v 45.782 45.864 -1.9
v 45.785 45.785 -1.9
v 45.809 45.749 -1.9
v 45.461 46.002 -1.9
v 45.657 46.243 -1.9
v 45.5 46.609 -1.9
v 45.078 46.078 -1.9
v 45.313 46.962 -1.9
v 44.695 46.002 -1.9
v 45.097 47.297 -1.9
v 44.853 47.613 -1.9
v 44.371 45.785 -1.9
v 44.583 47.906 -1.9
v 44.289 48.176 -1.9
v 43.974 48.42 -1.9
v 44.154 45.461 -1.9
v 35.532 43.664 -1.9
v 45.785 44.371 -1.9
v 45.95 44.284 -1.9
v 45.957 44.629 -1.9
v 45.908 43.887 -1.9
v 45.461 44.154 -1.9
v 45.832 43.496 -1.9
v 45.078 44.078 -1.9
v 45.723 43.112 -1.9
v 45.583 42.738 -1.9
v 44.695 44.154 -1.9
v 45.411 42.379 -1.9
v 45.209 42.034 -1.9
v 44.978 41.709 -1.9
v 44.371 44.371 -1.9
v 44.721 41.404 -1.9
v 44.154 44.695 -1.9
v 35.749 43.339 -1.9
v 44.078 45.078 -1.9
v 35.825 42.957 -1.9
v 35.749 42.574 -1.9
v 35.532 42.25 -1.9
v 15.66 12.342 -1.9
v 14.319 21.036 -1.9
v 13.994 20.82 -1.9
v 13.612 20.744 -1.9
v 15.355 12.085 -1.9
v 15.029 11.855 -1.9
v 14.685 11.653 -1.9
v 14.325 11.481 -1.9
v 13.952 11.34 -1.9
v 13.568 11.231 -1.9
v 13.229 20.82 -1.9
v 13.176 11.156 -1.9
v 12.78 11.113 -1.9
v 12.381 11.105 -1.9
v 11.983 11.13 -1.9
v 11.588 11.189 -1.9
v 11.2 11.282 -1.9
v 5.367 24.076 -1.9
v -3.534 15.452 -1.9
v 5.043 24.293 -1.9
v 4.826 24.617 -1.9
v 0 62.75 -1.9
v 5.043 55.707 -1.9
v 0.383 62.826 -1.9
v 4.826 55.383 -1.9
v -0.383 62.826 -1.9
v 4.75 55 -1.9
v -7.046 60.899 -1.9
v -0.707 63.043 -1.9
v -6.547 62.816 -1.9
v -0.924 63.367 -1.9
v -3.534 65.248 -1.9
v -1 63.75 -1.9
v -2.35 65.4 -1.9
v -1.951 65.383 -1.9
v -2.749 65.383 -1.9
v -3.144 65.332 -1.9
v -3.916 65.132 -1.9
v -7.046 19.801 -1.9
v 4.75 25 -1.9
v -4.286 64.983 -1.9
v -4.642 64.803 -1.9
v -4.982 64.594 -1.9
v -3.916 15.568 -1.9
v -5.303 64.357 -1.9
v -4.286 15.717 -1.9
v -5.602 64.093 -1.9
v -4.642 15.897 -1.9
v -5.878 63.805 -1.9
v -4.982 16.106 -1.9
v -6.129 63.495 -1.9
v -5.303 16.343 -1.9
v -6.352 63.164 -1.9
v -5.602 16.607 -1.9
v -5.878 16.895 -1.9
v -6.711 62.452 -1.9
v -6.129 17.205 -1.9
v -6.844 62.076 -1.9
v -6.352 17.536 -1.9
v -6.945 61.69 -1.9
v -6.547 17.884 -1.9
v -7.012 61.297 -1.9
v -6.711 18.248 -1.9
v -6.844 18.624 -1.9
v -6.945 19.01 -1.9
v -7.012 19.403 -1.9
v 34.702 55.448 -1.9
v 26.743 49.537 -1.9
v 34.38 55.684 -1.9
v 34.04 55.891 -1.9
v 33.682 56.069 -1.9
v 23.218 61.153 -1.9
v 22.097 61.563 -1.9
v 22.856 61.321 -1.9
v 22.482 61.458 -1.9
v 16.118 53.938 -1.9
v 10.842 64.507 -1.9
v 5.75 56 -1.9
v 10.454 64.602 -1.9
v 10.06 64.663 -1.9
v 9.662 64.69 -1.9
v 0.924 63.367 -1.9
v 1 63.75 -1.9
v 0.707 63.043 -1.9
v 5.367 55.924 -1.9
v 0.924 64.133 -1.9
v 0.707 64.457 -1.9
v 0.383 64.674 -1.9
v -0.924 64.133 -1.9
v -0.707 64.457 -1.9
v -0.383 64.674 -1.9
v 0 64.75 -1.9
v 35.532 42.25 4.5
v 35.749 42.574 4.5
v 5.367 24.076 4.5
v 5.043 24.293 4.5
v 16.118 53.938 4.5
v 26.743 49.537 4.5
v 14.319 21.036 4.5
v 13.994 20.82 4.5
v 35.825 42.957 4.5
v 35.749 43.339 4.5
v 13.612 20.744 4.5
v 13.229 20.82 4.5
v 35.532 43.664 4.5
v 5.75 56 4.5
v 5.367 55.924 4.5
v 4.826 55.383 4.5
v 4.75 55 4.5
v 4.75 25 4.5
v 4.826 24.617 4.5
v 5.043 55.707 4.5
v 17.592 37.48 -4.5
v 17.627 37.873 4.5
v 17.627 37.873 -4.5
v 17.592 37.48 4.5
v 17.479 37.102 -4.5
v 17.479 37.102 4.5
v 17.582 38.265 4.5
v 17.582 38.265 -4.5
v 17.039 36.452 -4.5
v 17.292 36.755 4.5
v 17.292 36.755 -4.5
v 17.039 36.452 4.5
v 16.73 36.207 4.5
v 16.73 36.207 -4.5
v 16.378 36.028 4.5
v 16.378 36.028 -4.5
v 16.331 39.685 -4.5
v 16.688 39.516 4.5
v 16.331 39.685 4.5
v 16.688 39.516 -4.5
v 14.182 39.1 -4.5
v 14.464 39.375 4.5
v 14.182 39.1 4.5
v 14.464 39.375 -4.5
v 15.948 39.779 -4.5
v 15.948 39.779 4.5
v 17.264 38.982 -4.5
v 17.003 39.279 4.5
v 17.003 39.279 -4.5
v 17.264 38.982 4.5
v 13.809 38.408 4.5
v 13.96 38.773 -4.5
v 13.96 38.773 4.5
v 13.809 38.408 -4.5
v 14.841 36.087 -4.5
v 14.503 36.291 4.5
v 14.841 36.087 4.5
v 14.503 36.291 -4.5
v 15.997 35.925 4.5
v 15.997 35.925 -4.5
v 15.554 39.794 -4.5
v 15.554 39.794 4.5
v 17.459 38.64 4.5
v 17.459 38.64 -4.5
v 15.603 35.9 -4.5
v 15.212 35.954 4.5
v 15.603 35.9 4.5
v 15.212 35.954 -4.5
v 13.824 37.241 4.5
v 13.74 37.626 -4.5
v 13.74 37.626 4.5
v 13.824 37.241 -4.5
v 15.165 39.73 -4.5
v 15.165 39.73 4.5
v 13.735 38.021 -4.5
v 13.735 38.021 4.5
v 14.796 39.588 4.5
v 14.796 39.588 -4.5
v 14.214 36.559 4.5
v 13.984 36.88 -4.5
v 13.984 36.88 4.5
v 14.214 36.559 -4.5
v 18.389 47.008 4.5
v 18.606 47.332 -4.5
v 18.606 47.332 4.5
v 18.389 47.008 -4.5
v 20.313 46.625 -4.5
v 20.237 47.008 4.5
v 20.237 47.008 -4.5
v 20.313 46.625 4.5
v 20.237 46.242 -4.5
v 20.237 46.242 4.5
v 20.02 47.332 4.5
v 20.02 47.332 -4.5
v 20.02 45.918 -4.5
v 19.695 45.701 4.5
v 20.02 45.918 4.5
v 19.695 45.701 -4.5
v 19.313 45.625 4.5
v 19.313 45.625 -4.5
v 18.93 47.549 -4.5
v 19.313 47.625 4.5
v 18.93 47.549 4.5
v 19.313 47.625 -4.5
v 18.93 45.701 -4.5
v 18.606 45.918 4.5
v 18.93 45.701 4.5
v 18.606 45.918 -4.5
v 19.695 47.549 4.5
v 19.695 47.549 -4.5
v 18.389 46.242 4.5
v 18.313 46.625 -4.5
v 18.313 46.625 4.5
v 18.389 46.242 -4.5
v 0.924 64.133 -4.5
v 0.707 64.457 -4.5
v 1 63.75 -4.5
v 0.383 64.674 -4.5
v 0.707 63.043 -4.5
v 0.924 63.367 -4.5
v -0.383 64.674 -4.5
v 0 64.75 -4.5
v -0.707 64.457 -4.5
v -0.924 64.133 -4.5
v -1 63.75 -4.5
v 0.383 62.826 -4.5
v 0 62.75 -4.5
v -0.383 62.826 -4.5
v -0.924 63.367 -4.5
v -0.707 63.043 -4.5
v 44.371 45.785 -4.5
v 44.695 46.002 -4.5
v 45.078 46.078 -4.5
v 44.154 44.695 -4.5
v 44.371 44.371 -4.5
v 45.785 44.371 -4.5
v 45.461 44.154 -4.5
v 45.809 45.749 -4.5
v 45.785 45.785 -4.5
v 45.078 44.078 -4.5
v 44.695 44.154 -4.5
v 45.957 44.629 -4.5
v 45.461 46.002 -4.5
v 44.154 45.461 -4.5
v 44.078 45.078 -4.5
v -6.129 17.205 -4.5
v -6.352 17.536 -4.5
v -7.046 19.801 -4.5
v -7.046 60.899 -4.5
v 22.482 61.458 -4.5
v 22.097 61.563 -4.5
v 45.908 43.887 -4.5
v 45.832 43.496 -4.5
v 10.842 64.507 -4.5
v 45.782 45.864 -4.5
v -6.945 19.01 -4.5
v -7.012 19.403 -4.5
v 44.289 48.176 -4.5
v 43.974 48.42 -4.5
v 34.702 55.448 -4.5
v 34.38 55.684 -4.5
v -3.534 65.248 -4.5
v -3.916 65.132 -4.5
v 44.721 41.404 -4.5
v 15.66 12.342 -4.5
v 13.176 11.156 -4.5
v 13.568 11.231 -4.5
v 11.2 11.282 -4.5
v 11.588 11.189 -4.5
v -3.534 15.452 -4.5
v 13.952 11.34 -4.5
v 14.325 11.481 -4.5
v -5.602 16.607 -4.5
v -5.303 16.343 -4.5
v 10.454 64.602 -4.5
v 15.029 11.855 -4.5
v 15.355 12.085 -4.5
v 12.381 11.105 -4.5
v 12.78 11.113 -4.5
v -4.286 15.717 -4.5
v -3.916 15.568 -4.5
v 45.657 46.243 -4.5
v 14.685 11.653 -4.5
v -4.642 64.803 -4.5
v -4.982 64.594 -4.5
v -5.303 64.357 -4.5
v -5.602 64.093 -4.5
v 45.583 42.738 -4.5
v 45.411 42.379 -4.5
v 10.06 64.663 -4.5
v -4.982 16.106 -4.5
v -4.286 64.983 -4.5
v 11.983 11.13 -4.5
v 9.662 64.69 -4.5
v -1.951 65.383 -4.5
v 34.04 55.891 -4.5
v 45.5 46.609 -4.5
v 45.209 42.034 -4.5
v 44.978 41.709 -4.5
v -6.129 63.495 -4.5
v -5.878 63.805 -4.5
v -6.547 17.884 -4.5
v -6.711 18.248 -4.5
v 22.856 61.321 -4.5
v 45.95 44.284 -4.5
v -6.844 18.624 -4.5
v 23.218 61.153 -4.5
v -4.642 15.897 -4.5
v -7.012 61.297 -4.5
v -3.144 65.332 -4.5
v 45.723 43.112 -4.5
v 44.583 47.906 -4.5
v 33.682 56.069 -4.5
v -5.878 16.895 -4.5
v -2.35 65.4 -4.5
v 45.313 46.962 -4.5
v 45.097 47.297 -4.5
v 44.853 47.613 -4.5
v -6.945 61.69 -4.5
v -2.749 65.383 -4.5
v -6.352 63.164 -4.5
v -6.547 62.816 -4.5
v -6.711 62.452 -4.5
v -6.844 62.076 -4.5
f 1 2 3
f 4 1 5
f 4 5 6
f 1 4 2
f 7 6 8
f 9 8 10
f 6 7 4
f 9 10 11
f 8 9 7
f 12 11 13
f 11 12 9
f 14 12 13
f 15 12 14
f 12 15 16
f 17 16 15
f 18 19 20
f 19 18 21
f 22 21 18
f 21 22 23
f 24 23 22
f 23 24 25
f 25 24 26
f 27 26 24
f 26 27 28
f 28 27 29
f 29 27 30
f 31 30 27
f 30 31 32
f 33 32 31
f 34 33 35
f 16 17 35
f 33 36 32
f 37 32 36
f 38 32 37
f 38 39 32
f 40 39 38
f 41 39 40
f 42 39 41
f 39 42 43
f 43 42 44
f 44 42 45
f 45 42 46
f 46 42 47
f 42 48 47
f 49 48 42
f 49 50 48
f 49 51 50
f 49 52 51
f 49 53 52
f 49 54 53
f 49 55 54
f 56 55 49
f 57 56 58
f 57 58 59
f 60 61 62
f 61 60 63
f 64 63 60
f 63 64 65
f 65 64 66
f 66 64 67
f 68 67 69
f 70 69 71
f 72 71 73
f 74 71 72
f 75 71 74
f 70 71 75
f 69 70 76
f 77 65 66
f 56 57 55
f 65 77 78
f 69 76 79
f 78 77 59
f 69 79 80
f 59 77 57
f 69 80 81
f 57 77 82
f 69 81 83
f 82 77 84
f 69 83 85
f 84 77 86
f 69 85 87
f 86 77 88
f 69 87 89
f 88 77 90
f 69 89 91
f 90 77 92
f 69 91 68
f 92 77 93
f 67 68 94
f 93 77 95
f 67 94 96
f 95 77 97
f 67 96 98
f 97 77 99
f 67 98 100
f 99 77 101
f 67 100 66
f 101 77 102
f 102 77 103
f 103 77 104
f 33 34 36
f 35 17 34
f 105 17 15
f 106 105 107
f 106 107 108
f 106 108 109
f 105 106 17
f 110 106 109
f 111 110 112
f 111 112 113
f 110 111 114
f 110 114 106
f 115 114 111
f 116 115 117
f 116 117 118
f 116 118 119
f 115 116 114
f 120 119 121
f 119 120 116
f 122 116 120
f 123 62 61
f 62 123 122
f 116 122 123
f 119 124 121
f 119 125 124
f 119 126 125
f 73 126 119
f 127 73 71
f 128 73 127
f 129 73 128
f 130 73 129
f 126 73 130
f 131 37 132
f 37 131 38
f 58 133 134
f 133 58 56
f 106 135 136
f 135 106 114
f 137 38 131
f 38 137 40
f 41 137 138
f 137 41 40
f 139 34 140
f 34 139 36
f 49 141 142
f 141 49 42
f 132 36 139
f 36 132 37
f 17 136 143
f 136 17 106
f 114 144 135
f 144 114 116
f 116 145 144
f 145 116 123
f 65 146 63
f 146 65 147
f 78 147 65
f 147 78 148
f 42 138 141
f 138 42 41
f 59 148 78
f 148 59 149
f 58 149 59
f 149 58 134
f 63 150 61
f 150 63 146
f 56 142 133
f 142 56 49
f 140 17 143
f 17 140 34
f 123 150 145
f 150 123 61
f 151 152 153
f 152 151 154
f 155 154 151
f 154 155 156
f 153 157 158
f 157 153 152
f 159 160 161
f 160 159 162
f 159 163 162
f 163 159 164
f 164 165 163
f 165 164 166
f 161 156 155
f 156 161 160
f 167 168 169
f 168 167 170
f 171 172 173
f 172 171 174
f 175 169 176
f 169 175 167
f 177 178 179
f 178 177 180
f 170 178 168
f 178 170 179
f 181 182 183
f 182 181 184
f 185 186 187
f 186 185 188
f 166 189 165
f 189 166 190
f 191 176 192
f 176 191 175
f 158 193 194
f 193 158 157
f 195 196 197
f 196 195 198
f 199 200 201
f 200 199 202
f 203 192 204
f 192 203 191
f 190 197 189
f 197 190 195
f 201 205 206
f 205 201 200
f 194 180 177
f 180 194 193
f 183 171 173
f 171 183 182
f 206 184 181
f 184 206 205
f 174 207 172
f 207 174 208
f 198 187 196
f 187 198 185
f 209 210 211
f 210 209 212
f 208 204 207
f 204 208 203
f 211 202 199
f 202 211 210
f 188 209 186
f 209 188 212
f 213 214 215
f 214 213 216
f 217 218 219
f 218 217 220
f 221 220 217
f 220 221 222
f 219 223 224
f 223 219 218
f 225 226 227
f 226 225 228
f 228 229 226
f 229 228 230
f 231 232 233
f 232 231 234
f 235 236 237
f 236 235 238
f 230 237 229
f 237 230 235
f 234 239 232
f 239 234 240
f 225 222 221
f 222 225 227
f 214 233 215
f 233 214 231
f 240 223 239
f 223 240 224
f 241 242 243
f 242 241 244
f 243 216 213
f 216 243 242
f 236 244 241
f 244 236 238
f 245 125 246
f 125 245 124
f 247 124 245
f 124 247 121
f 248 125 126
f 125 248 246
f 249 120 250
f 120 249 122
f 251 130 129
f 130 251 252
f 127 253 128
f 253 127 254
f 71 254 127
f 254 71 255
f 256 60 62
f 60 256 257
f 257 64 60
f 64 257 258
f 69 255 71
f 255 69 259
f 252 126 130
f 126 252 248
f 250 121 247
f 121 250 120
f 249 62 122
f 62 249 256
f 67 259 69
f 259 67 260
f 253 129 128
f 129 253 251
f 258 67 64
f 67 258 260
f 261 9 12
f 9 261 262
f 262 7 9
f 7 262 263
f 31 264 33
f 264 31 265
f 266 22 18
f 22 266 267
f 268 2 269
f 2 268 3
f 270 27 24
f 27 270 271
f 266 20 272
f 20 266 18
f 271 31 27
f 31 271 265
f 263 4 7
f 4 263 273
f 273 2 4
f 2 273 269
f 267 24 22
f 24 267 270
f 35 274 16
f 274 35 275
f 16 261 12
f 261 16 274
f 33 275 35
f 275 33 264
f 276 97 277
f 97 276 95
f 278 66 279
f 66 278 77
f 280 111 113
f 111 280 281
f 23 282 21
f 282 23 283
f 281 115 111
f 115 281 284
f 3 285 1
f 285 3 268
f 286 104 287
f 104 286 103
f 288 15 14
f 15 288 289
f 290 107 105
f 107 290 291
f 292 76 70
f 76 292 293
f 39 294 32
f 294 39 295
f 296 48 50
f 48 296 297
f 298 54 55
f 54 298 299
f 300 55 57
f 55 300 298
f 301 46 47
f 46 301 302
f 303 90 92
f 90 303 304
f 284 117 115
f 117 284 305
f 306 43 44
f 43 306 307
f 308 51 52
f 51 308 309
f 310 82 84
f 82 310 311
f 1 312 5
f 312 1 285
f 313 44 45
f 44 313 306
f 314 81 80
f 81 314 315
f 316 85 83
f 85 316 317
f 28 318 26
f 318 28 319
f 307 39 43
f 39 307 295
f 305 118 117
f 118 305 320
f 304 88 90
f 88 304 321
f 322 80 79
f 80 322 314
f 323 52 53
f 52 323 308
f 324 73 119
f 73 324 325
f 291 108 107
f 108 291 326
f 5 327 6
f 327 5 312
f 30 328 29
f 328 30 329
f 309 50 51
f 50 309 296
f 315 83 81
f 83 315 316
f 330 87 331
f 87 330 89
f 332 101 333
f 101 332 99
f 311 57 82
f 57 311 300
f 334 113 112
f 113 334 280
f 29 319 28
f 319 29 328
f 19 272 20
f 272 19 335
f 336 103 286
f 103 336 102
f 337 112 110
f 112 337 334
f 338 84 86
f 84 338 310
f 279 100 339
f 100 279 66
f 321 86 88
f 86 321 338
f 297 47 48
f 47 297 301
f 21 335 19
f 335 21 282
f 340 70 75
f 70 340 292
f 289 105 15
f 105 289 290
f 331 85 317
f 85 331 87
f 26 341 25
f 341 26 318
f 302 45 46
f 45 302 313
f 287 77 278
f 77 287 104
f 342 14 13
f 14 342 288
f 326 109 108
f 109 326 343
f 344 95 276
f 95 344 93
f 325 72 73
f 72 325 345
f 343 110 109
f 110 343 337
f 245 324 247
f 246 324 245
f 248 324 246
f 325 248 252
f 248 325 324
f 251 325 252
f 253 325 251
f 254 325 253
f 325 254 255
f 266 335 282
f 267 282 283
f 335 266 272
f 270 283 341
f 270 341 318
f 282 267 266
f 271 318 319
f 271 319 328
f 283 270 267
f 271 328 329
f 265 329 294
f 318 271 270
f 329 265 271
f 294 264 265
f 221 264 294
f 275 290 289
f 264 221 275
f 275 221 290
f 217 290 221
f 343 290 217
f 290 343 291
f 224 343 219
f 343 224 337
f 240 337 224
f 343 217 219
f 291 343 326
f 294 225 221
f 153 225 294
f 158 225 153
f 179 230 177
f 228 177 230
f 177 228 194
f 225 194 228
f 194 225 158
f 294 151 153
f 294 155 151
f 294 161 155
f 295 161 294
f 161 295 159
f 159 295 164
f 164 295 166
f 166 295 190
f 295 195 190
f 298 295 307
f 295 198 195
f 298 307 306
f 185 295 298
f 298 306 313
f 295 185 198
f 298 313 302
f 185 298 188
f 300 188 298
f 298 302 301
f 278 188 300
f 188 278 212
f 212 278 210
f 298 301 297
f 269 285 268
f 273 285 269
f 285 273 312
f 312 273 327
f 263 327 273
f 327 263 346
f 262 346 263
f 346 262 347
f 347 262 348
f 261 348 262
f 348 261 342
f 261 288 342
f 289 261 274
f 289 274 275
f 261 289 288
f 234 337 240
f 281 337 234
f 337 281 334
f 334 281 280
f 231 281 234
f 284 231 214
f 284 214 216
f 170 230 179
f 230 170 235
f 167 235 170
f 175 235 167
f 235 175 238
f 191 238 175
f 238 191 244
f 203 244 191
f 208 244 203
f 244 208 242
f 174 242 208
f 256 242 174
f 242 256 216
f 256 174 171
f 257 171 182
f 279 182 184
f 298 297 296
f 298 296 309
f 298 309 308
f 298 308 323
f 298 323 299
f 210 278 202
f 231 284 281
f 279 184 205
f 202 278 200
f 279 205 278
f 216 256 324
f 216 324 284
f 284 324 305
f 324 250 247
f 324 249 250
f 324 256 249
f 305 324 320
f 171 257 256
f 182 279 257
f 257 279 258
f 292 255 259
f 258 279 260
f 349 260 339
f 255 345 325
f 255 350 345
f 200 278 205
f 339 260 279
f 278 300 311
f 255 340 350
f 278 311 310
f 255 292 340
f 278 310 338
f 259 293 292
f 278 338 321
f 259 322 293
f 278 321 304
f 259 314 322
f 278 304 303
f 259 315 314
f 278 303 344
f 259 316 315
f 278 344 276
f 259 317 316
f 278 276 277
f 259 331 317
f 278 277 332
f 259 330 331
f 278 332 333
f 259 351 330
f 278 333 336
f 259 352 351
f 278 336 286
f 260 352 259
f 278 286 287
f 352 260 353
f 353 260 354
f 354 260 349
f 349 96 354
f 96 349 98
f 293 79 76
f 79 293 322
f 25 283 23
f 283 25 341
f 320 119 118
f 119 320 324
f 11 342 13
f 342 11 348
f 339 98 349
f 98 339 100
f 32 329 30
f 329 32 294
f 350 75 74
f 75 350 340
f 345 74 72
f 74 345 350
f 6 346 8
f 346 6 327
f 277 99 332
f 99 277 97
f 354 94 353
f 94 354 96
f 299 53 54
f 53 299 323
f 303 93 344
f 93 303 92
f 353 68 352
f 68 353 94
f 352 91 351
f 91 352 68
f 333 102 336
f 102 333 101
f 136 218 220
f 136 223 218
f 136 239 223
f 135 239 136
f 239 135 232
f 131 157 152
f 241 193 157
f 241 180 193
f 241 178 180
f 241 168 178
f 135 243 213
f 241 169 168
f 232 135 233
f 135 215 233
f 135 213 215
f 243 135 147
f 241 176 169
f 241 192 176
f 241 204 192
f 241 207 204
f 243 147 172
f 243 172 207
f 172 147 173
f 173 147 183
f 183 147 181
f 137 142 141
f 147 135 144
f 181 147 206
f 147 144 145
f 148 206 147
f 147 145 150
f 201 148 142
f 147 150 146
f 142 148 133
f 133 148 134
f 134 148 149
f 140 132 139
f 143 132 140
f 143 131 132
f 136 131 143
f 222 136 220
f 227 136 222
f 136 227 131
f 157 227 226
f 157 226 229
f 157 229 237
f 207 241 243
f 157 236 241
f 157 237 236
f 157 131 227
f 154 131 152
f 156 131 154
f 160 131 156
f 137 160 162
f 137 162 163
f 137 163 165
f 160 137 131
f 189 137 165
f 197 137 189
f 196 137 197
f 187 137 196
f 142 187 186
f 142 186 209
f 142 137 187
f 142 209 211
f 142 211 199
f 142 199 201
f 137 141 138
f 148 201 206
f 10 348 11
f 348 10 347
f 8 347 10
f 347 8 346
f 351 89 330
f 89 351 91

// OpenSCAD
include <MCAD/bearing.scad>

// ---------------------------
// Constants
// ---------------------------
$fa = 1;
$fs = 0.4;
in_to_mm = 25.4;
gap = 1.25; //1/32 * in_to_mm;
nut_gap = 7;//3/4 * in_to_mm;
eps = .15;

bearingModel = 608; //608
bearing_depth = bearingWidth(bearingModel);
bearing_or = bearingOuterDiameter(bearingModel)/2;
bearing_ir = bearingInnerDiameter(bearingModel)/2;
axel_ir = bearing_ir+.1;
alignment_bolt_r = 3.9/2;


// ---------------------------
// Variables
// ---------------------------
num_holes=8;
sectors = num_holes;
sector_degrees = 360 / sectors;

// Bar Magent values
bar_mag_length = 29.3;//29.2;
bar_mag_width = 9.5;//9.4;
bar_mag_depth = 6;//5;
border = 5;

// Coil related values
coil_wire_width = bar_mag_width;
coil_inner_r = 1;
coil_center_hole_r = bearing_or+eps;

// Calculated values
bar_mag_cir = num_holes*2*bar_mag_width;
bar_mag_disk_r = round(bar_mag_cir/(3.14159*2)+bar_mag_length+border+2);
bar_mag_disk_depth = bar_mag_depth;
coil_disk_r = round(bar_mag_disk_r + coil_wire_width + border);
coil_disk_depth = bearing_depth;
coil_disk_base = .6;


//Print values
echo(str("bearing_depth:", bearing_depth));
echo(str("sector_degrees:", sector_degrees));
echo(str("bar_mag_disk_r:", bar_mag_disk_r));
echo(str("bar_mag_disk_depth:", bar_mag_disk_depth));
echo(str("coil_disk_r:", coil_disk_r));
echo(str("coil_disk_depth:", coil_disk_depth));

//rotate([0,0,sector_degrees*$t])
//barMagDisk();
//translate([0,0,10]) {
//    #barMagCoilHolderArray();
//    %barMagCoilDisk(bearing=true);
//}

//barMagCoilHolderDiff();
//barMagCoilDisk();
barMagCoilHolderBottom();
//translate([0,0,10])barMagCoilHolderTop();

render_mode = "joe"; //"FULL", "PRINT", "TEST";
print_mode = "MAG"; //"MAG","COIL","HOLDER_TOP","HOLDER_BOT";

// Main rendering code
if (render_mode=="FULL") {
    renderFull();
} else if (render_mode=="PRINT") {
    renderPrint();
} else if (render_mode=="TEST") {
    renderTest();
}

module renderFull() {
    // Coil Disk
    //#barMagCoilHolderArray();
    barMagCoilDisk(bearing=true);
    
    // Rotating Magnet Disks (animate use: fps=1, steps=12)
    z_offset = (bar_mag_disk_depth + bearing_depth)/2 +1;
    rotate([0,0,sector_degrees*$t]) {
        translate([0,0,z_offset])
        %barMagDisk();
        translate([0,0,-z_offset])
        %barMagDisk();
    }
}

module renderPrint() {
    if (print_mode=="MAG") {
        // Magnet Disk1
        barMagDisk();
    } else if (print_mode=="COIL") {
        // COIL Disk
        barMagCoilDisk();
    } else if (print_mode=="HOLDER_TOP") {
        // Wire coil holder top
        barMagCoilHolderTop();
    } else if (print_mode=="HOLDER_BOT") {
        // Wire coil holder top
        barMagCoilHolderBottom();
    }
}

// ---------------------------------------
// Rotating Bar Magnet Disk Modules
// ---------------------------------------

// Bar Magnet Disk
module barMagDisk(h=bar_mag_depth) {
    difference() {
        cylinder(h=h,r=bar_mag_disk_r,center=true);
        //remove holes for bar magnets
        barMagHoles(bar_mag_disk_r, border);
        //remove hole for main axel
        cylinder(h=h*2,r=axel_ir,center=true);
    }
}

module barMagHoles(r,b,x=bar_mag_length,y=bar_mag_width,z=20) {
    sectors = num_holes;
    sector_degrees = 360 / sectors;
    for(sector = [1 : sectors]) {
        angle = sector_degrees * sector;
        rotate([0,0,angle])barMagHole(r,b,x,y,z);
    }    
}

module barMagHole(r,b,x=bar_mag_length,y=bar_mag_width,z=20) {
    translate([r-(x/2)-b,0,0])cube([x, y, z], center=true);
}

// ---------------------------------------
// Stationary Coil Disk Modules
// ---------------------------------------

// Stationary Bar Mag Coil Disk with trapezoid coils
module barMagCoilDisk(h=coil_disk_depth, bearing=false) {
    hole_or = bar_mag_disk_r + (coil_disk_r-bar_mag_disk_r)/1.5;
    // Disk
    difference() {
        //main structure
        cylinder(h=h,r=coil_disk_r,center=true);
        //remove trapezoids for coils
        //translate([0,0,-h])barMagCoilHolderOuterArray(z=20);
        translate([0,0,+coil_disk_base])barMagCoilHolderArray(z=h);
        // remove center hole for bearing
        cylinder(h=h*2,r=coil_center_hole_r,center=true);
        // remove outer alignment holes
        structureHoles(h=h,radius=hole_or,hole_r=alignment_bolt_r,sectors=num_holes*2);
        // remove wire channels
        wireChannels(h=h,radius=hole_or,hole_r=alignment_bolt_r,sectors=num_holes);
    }
    if (bearing == true) {
        translate([0, 0, -bearing_depth/2])
        bearing(model=bearingModel, outline=false);
    }
}


// ---------------------------------------
// Coil Holder Modules
// ---------------------------------------

module barMagCoilHolderTop(z=2) {
    difference() {
        barMagCoilHolderOuterHull(y=coil_wire_width-.1,z=z);
        barMagCoilHolderCenterHoles();
    }
}

module barMagCoilHolderBottom(z=coil_disk_depth) {
    difference() {
        barMagCoilHolderOuterHull(y=coil_wire_width-.1,z=z+2);
        translate([0,0,coil_disk_base+1])barMagCoilHolderDiff(z=z);
        barMagCoilHolderCenterHoles();
        barMagCoilHolderWireHoles();
    }
}

module barMagCoilHolderCenterHoles(z=coil_disk_depth) {
    coil_center_r = coil_disk_r - border - coil_wire_width - bar_mag_length/1.5;
    coil_offset_r = coil_center_r + coil_wire_width;
    rotate([0,0,-sector_degrees/2]) {
        translate([0,coil_center_r,0])cylinder(h=z*2,r=alignment_bolt_r,center=true);
        translate([0,coil_offset_r,0])cylinder(h=z*2,r=1,center=true);
    }
}

module barMagCoilHolderWireHoles(z=coil_disk_depth) {
    coil_offset_r = coil_disk_r - border - coil_wire_width/2 - 1.5;
    translate([0,coil_offset_r,0])cylinder(h=z*2,r=1,center=true);
    rotate([0,0,-sector_degrees]) {
        translate([0,coil_offset_r,0])cylinder(h=z*2,r=1,center=true);
    }
}

module barMagCoilHolderArray(z=10) {
    sectors = num_holes;
    sector_degrees = 360 / sectors*2;
    for(sector = [1 : sectors]) {
        angle = sector_degrees * sector;
        rotate([0,0,angle])barMagCoilHolderDiff(z=z);
    }    
}

module barMagCoilHolderDiff(z=10) {
    difference() {
        barMagCoilHolderOuterHull(z=z);
        barMagCoilHolderInnerHull(z=z+2);
    }
}

module barMagCoilHolderOuterArray(z=20) {
    sectors = num_holes;
    sector_degrees = 360 / sectors*2;
    for(sector = [1 : sectors]) {
        angle = sector_degrees * sector;
        rotate([0,0,angle])barMagCoilHolderOuterHull(z=z);
    }    
}

module barMagCoilHolderOuterHull(y=coil_wire_width,z=10) {
    hull() {
        barMagCoilOutlines(r=bar_mag_disk_r,b=border,y=y,z=z);
    }
}
module barMagCoilOutlines(r,b,x=bar_mag_length,y=coil_wire_width,z=10) {
    sectors = num_holes;
    sector_degrees = 360 / sectors;
    for(sector = [1 : 0.25 : 2]) {
        angle = sector_degrees * sector;
        rotate([0,0,angle])barMagCoilOut(r,b,x,y,z);
    }    
}

module barMagCoilOut(r,b,x=bar_mag_length,y=coil_wire_width,z=10) {
    x_off = x/2 + y/2 + coil_inner_r;
    y_off = y/4;
    translate([r-(x/2)-b,0,0]){
        #translate([x_off,y_off,0])cylinder(h=z,r=y/2,center=true);
        %cube([x, y, z], center=true);
        #translate([-x_off,y_off,0])cylinder(h=z,r=y/2,center=true);
    }
}


module barMagCoilHolderInnerHull(z=20) {
    hull() {
        barMagCoilInlines(bar_mag_disk_r,border,z=z);
    }
}

module barMagCoilInlines(r,b,x=30,y=coil_wire_width,z=20) {
    sectors = num_holes;
    sector_degrees = 360 / sectors;
    for(sector = [1 : 0.5 : 2]) {
        angle = sector_degrees * sector;
        rotate([0,0,angle])barMagCoilIn(r,b,sector,x,y,z);
    }    
}

module barMagCoilIn(r,b,sector,x=30,y=coil_wire_width,z=20) {
    x_off = x/2;
    y_off = y/2 + coil_inner_r;
    translate([r-(x/2)-b,0,0]){
        if (sector == 1) {
            translate([x_off,y_off,0])cylinder(h=z,r=coil_inner_r,center=true);
            translate([0,y_off,0])cube([x, coil_inner_r*2, z], center=true);
            translate([-x_off,y_off,0])cylinder(h=z,r=coil_inner_r,center=true);
        } else if (sector == 2) {
            translate([x_off,-y_off,0])cylinder(h=z,r=coil_inner_r,center=true);
            translate([0,-y_off,0])cube([x, coil_inner_r*2, z], center=true);
            translate([-x_off,-y_off,0])cylinder(h=z,r=coil_inner_r,center=true);
        } else {
            translate([x_off,y_off,0])cylinder(h=z,r=coil_inner_r,center=true);
            translate([x_off,-y_off,0])cylinder(h=z,r=coil_inner_r,center=true);
        }
    }
}


// ---------------------------------------
// Common Modules
// ---------------------------------------

module wireChannels(h, radius, hole_r, sectors=num_holes) {
    sector_degrees = 360 / sectors;
    for(sector = [1 : 1 : sectors]) {
        angle = sector_degrees * sector;
        rotate([0,0,angle]){
            translate([0,radius,hole_r/4])cube([hole_r,border*4,hole_r], center=true);
        }
    }    
}

module structureHoles(h, radius, hole_r, sectors=num_holes) {
    sector_degrees = 360 / sectors;
    for(sector = [1 : 1 : sectors]) {
        angle = sector_degrees * sector;
        x_pos = radius * sin(angle);
        y_pos = radius * cos(angle);
        translate([x_pos,y_pos,0]){
            hole(h, hole_r);
        }
    }    
}

module hole(h, hole_r) {
    cylinder(h=h+2,r=hole_r,center=true);
}


// ---------------------------------------
// Test Print Module
// ---------------------------------------

module renderTest(x=bar_mag_width,y=bar_mag_length,z=bar_mag_disk_depth) {
    difference() {
        //Base
        cube([x+border,y+border,z], center=true);
        //Bar Magnet hole
        cube([x, y, z+2], center=true);
    }
}
